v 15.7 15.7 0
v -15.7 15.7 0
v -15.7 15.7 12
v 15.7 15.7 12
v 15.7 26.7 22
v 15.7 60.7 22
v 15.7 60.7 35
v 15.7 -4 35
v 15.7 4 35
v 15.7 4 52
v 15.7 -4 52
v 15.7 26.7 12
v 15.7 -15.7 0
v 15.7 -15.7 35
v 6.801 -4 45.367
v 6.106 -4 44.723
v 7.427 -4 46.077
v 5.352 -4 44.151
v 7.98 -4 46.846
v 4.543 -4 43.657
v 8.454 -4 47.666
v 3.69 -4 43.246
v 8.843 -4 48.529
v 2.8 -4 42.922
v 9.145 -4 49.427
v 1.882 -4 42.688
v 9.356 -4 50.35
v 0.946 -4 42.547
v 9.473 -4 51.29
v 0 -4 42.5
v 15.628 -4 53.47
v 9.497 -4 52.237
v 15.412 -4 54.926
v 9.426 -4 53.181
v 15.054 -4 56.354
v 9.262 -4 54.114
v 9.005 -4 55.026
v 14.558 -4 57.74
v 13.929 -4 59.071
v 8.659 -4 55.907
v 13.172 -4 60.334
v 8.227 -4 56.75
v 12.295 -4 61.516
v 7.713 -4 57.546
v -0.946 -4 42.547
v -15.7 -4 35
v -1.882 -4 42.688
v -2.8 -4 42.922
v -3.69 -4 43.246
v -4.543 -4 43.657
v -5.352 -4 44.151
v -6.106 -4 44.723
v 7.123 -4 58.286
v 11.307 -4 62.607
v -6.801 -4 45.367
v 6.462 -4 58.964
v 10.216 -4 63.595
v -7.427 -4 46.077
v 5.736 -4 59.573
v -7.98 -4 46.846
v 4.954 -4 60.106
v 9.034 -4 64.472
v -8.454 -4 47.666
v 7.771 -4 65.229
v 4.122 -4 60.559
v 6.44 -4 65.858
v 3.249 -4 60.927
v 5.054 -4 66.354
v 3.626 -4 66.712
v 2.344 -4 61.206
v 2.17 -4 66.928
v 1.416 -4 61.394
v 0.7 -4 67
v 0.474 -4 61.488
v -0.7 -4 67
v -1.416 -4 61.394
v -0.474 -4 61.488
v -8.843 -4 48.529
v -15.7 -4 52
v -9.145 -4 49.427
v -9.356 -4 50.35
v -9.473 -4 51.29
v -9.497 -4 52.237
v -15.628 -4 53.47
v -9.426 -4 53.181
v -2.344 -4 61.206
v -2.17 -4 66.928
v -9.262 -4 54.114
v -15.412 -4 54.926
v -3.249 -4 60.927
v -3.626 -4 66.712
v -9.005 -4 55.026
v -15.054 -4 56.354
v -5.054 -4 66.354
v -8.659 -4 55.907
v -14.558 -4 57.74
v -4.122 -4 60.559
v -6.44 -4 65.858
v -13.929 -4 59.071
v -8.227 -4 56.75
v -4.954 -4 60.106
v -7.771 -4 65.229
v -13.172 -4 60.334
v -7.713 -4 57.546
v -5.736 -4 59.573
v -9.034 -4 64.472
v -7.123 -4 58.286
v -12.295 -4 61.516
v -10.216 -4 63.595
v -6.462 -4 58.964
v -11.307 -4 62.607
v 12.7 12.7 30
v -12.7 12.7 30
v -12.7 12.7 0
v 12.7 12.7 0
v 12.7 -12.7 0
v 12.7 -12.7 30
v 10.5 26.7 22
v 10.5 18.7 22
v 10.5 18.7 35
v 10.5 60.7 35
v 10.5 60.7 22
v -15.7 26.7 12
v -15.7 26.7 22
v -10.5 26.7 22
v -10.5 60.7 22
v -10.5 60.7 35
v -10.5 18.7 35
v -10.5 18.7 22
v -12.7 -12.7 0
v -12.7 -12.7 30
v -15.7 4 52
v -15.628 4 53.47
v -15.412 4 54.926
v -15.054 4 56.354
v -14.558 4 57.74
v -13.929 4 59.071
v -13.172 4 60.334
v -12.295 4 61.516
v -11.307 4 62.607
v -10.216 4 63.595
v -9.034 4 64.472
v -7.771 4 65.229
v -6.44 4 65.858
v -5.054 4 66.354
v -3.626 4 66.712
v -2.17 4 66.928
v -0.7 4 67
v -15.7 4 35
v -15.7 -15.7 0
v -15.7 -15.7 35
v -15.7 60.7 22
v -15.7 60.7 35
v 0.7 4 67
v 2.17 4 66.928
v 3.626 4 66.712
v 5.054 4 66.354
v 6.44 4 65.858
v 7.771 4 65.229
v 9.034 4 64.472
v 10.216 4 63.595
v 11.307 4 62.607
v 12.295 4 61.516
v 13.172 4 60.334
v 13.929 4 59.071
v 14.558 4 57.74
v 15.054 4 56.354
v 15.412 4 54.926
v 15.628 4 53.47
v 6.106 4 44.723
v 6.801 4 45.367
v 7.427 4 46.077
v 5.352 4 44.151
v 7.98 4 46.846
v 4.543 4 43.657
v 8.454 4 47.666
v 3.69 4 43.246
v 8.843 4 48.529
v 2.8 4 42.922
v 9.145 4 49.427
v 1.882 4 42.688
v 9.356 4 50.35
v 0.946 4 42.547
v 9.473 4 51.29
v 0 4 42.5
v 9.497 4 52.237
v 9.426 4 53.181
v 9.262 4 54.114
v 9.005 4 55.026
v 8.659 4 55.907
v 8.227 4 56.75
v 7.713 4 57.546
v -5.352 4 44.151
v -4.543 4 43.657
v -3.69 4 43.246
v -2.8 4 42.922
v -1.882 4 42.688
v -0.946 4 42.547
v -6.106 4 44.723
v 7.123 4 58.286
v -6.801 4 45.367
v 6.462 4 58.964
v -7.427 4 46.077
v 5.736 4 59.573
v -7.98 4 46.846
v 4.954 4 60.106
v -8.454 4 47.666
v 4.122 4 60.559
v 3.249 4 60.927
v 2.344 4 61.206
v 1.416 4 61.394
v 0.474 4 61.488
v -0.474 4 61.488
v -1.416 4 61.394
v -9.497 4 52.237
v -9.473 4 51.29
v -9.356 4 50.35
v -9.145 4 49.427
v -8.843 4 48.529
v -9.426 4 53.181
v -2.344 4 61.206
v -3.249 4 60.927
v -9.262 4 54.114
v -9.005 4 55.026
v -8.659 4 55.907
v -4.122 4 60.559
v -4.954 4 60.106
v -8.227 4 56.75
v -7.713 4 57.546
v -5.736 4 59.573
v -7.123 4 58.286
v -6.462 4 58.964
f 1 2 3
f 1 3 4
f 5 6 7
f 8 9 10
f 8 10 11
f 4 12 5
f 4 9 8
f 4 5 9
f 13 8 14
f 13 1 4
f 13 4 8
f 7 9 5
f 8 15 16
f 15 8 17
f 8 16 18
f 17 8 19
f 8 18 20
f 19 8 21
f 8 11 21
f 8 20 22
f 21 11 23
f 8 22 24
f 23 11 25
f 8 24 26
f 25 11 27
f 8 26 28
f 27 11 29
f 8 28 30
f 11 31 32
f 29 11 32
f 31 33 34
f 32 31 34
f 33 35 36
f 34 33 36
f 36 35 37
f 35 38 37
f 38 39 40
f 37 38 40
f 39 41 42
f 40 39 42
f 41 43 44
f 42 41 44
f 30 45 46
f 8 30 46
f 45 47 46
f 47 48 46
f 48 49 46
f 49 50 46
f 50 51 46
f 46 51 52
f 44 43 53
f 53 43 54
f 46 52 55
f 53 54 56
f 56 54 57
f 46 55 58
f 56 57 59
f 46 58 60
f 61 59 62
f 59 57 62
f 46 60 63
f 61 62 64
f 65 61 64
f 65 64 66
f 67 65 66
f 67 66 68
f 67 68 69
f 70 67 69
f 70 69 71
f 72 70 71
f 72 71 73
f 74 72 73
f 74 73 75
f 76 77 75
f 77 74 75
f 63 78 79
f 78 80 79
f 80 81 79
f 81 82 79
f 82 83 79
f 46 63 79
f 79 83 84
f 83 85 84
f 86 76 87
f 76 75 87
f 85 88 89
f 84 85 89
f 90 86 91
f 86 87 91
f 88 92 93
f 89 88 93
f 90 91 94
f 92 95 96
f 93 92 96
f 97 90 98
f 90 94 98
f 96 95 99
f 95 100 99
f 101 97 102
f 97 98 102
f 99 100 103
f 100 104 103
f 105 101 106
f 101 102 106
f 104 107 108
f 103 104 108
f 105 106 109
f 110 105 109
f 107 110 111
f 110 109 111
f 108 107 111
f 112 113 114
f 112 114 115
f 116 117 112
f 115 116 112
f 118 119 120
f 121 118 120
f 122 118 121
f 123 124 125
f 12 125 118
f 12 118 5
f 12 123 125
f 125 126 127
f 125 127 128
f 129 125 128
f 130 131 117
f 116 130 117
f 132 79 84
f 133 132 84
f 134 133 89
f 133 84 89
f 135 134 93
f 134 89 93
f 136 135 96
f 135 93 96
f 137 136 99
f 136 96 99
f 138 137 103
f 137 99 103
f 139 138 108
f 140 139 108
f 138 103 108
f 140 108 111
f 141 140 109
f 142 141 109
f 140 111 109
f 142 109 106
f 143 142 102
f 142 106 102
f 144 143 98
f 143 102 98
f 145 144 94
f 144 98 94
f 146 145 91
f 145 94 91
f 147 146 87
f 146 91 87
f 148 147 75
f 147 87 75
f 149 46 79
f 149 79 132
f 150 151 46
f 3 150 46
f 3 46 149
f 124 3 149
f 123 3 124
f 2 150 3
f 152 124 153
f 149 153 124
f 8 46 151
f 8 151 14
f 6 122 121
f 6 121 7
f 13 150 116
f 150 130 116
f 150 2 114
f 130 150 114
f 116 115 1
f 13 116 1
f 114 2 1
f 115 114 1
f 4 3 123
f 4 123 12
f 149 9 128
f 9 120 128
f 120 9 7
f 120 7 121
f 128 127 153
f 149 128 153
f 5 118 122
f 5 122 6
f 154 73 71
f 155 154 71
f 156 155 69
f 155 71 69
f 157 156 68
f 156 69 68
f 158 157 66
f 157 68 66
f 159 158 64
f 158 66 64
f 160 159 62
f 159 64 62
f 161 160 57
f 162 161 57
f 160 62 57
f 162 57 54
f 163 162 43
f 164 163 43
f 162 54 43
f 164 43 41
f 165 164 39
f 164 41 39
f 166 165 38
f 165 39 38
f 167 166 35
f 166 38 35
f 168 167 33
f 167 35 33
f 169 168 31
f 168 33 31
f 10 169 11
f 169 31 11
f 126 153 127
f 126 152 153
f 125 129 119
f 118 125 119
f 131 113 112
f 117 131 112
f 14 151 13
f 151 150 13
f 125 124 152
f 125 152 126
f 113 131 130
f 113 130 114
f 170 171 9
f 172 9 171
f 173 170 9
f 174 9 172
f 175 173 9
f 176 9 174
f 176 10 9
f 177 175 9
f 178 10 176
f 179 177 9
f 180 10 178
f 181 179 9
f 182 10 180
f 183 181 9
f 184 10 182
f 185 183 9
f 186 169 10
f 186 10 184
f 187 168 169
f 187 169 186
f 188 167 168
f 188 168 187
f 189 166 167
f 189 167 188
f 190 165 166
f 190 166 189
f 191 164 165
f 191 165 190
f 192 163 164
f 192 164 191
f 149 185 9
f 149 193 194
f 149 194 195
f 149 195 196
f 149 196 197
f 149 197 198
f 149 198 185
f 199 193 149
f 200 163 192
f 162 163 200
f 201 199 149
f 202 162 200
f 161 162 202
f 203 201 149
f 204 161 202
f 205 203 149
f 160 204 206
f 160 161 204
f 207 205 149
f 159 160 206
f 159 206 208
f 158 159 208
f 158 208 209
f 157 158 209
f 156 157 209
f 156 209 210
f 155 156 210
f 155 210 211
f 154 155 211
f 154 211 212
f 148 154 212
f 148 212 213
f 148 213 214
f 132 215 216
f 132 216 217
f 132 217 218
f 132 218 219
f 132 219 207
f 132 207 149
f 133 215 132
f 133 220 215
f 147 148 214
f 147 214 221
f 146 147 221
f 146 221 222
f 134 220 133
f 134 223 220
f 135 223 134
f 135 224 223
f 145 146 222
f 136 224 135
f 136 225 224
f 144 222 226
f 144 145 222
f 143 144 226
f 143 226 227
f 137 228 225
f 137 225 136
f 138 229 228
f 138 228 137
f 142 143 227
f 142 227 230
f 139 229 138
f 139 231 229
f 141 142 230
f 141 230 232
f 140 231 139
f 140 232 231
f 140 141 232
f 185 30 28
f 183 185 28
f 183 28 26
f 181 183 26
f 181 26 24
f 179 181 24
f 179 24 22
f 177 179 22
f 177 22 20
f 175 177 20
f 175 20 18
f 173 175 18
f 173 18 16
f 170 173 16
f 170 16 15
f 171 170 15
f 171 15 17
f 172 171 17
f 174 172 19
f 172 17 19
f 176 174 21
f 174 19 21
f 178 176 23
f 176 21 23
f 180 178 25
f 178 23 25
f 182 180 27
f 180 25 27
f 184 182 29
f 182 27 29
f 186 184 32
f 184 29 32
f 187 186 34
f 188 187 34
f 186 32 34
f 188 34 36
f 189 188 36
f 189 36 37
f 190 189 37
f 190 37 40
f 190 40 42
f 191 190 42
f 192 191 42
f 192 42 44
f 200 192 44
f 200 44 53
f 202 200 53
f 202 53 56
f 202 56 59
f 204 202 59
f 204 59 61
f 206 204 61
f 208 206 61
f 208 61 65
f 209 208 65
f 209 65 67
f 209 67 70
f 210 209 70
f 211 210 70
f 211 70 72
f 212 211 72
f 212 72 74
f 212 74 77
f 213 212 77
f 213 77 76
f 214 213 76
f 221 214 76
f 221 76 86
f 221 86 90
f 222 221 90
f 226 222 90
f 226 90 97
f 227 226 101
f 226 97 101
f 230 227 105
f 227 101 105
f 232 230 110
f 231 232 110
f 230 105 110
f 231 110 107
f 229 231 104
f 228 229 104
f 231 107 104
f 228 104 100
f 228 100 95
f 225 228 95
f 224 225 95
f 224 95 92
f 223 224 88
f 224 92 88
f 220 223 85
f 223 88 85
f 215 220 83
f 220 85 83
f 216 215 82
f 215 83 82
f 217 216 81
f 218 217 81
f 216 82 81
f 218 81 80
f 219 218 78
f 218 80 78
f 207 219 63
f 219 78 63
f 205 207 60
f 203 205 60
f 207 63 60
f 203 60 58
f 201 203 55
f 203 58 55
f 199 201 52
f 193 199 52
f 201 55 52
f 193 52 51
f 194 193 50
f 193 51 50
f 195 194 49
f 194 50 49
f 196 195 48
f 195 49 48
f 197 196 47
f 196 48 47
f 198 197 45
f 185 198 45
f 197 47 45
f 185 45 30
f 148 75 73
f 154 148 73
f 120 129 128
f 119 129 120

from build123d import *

# Parameters (mm, degrees)
SKETCH4_W            = 31.4
SKETCH4_H            = 31.4
SKETCH4_W_2          = 25.4
SKETCH4_H_2          = 25.4
BOSS_EXTRUDE3_DEPTH  = 30
SKETCH5_W            = 31.4
SKETCH5_H            = 31.4
BOSS_EXTRUDE4_DEPTH  = 5
SKETCH6_W            = 31.4
SKETCH6_H            = 8
BOSS_EXTRUDE5_DEPTH  = 5
BOSS_EXTRUDE6_DEPTH  = 8
SKETCH8_R            = 9.5
BOSS_EXTRUDE7_DEPTH  = 8
SKETCH9_W            = 31.4
SKETCH9_H            = 10
BOSS_EXTRUDE8_DEPTH  = 5
SKETCH10_W           = 31.4
SKETCH10_H           = 10
BOSS_EXTRUDE9_DEPTH  = 11
SKETCH11_W           = 5.2
SKETCH11_H           = 10
BOSS_EXTRUDE10_DEPTH = 40
BOSS_EXTRUDE11_DEPTH = 3
CUT_EXTRUDE1_START   = 8
SKETCH8_2_R          = 9.5
CUT_EXTRUDE1_DEPTH   = 24
SKETCH14_W           = 21
SKETCH14_H           = 13
CUT_EXTRUDE2_DEPTH   = 2


with BuildPart() as part:
    # Sketch4 → Boss-Extrude3 (new body)
    with BuildSketch(Plane.XY):
        Rectangle(SKETCH4_W, SKETCH4_H)
        Rectangle(SKETCH4_W_2, SKETCH4_H_2, mode=Mode.SUBTRACT)
    extrude(amount=BOSS_EXTRUDE3_DEPTH)

    # Sketch5 → Boss-Extrude4 (add)
    with BuildSketch(Plane.XY.offset(30)):
        Rectangle(SKETCH5_W, SKETCH5_H)
    extrude(amount=BOSS_EXTRUDE4_DEPTH)

    # Sketch6 → Boss-Extrude5 (add)
    with BuildSketch(Plane.XY.offset(35)):
        Rectangle(SKETCH6_W, SKETCH6_H)
    extrude(amount=BOSS_EXTRUDE5_DEPTH)

    # Sketch7 → Boss-Extrude6 (add)
    with BuildSketch(Plane.XZ.offset(4)):
        with BuildLine():
            Line((-15.7, 40), (-15.7, 52))
            ThreePointArc((-15.7, 52), (-11.306601718, 62.606601718), (-0.7, 67))
            Line((-0.7, 67), (0.7, 67))
            ThreePointArc((0.7, 67), (11.306601718, 62.606601718), (15.7, 52))
            Line((15.7, 52), (15.7, 40))
            Line((15.7, 40), (-15.7, 40))
        make_face()
    extrude(amount=-BOSS_EXTRUDE6_DEPTH)

    # Sketch8 → Boss-Extrude7 (add)
    with BuildSketch(Plane.XZ.offset(4)):
        with Locations((0, 52)):
            Circle(SKETCH8_R)
    boss_extrude7 = extrude(amount=BOSS_EXTRUDE7_DEPTH)

    # Mirror1: Boss-Extrude7 across plane
    add(boss_extrude7.mirror(Plane.ZX))

    # Sketch9 → Boss-Extrude8 (add)
    with BuildSketch(Plane(origin=(0, 15.7, 0), x_dir=(1, 0, 0), z_dir=(0, 1, 0))):
        with Locations((0, -27)):
            Rectangle(SKETCH9_W, SKETCH9_H)
    extrude(amount=BOSS_EXTRUDE8_DEPTH)

    # Sketch10 → Boss-Extrude9 (add)
    with BuildSketch(Plane(origin=(0, 15.7, 0), x_dir=(1, 0, 0), z_dir=(0, 1, 0))):
        with Locations((0, -17)):
            Rectangle(SKETCH10_W, SKETCH10_H)
    extrude(amount=BOSS_EXTRUDE9_DEPTH)

    # Sketch11 → Boss-Extrude10 (add)
    with BuildSketch(Plane(origin=(0, 20.7, 0), x_dir=(1, 0, 0), z_dir=(0, 1, 0))):
        with Locations((-13.1, -27)):
            Rectangle(SKETCH11_W, SKETCH11_H)
        with Locations((13.1, -27)):
            Rectangle(SKETCH11_W, SKETCH11_H)
    extrude(amount=BOSS_EXTRUDE10_DEPTH)

    # Sketch12 → Boss-Extrude11 (add)
    with BuildSketch(Plane.XY.offset(32)):
        Polygon((-15.7, 60.7), (-10.5, 60.7), (-10.5, 20.7), (10.5, 20.7), (10.5, 60.7), (15.7, 60.7), (15.7, 15.7), (-15.7, 15.7), align=None)
    extrude(amount=BOSS_EXTRUDE11_DEPTH)

    # Sketch8<2> → Cut-Extrude1 (cut)
    with BuildSketch(Plane.XZ.offset(4).offset(CUT_EXTRUDE1_START)):
        with Locations((0, 52)):
            Circle(SKETCH8_2_R)
    extrude(amount=-CUT_EXTRUDE1_DEPTH, mode=Mode.SUBTRACT)

    # Sketch14 → Cut-Extrude2 (cut)
    with BuildSketch(Plane(origin=(0, 20.7, 0), x_dir=(1, 0, 0), z_dir=(0, 1, 0))):
        with Locations((0, -28.5)):
            Rectangle(SKETCH14_W, SKETCH14_H)
    extrude(amount=-CUT_EXTRUDE2_DEPTH, mode=Mode.SUBTRACT)


solid = part.part
